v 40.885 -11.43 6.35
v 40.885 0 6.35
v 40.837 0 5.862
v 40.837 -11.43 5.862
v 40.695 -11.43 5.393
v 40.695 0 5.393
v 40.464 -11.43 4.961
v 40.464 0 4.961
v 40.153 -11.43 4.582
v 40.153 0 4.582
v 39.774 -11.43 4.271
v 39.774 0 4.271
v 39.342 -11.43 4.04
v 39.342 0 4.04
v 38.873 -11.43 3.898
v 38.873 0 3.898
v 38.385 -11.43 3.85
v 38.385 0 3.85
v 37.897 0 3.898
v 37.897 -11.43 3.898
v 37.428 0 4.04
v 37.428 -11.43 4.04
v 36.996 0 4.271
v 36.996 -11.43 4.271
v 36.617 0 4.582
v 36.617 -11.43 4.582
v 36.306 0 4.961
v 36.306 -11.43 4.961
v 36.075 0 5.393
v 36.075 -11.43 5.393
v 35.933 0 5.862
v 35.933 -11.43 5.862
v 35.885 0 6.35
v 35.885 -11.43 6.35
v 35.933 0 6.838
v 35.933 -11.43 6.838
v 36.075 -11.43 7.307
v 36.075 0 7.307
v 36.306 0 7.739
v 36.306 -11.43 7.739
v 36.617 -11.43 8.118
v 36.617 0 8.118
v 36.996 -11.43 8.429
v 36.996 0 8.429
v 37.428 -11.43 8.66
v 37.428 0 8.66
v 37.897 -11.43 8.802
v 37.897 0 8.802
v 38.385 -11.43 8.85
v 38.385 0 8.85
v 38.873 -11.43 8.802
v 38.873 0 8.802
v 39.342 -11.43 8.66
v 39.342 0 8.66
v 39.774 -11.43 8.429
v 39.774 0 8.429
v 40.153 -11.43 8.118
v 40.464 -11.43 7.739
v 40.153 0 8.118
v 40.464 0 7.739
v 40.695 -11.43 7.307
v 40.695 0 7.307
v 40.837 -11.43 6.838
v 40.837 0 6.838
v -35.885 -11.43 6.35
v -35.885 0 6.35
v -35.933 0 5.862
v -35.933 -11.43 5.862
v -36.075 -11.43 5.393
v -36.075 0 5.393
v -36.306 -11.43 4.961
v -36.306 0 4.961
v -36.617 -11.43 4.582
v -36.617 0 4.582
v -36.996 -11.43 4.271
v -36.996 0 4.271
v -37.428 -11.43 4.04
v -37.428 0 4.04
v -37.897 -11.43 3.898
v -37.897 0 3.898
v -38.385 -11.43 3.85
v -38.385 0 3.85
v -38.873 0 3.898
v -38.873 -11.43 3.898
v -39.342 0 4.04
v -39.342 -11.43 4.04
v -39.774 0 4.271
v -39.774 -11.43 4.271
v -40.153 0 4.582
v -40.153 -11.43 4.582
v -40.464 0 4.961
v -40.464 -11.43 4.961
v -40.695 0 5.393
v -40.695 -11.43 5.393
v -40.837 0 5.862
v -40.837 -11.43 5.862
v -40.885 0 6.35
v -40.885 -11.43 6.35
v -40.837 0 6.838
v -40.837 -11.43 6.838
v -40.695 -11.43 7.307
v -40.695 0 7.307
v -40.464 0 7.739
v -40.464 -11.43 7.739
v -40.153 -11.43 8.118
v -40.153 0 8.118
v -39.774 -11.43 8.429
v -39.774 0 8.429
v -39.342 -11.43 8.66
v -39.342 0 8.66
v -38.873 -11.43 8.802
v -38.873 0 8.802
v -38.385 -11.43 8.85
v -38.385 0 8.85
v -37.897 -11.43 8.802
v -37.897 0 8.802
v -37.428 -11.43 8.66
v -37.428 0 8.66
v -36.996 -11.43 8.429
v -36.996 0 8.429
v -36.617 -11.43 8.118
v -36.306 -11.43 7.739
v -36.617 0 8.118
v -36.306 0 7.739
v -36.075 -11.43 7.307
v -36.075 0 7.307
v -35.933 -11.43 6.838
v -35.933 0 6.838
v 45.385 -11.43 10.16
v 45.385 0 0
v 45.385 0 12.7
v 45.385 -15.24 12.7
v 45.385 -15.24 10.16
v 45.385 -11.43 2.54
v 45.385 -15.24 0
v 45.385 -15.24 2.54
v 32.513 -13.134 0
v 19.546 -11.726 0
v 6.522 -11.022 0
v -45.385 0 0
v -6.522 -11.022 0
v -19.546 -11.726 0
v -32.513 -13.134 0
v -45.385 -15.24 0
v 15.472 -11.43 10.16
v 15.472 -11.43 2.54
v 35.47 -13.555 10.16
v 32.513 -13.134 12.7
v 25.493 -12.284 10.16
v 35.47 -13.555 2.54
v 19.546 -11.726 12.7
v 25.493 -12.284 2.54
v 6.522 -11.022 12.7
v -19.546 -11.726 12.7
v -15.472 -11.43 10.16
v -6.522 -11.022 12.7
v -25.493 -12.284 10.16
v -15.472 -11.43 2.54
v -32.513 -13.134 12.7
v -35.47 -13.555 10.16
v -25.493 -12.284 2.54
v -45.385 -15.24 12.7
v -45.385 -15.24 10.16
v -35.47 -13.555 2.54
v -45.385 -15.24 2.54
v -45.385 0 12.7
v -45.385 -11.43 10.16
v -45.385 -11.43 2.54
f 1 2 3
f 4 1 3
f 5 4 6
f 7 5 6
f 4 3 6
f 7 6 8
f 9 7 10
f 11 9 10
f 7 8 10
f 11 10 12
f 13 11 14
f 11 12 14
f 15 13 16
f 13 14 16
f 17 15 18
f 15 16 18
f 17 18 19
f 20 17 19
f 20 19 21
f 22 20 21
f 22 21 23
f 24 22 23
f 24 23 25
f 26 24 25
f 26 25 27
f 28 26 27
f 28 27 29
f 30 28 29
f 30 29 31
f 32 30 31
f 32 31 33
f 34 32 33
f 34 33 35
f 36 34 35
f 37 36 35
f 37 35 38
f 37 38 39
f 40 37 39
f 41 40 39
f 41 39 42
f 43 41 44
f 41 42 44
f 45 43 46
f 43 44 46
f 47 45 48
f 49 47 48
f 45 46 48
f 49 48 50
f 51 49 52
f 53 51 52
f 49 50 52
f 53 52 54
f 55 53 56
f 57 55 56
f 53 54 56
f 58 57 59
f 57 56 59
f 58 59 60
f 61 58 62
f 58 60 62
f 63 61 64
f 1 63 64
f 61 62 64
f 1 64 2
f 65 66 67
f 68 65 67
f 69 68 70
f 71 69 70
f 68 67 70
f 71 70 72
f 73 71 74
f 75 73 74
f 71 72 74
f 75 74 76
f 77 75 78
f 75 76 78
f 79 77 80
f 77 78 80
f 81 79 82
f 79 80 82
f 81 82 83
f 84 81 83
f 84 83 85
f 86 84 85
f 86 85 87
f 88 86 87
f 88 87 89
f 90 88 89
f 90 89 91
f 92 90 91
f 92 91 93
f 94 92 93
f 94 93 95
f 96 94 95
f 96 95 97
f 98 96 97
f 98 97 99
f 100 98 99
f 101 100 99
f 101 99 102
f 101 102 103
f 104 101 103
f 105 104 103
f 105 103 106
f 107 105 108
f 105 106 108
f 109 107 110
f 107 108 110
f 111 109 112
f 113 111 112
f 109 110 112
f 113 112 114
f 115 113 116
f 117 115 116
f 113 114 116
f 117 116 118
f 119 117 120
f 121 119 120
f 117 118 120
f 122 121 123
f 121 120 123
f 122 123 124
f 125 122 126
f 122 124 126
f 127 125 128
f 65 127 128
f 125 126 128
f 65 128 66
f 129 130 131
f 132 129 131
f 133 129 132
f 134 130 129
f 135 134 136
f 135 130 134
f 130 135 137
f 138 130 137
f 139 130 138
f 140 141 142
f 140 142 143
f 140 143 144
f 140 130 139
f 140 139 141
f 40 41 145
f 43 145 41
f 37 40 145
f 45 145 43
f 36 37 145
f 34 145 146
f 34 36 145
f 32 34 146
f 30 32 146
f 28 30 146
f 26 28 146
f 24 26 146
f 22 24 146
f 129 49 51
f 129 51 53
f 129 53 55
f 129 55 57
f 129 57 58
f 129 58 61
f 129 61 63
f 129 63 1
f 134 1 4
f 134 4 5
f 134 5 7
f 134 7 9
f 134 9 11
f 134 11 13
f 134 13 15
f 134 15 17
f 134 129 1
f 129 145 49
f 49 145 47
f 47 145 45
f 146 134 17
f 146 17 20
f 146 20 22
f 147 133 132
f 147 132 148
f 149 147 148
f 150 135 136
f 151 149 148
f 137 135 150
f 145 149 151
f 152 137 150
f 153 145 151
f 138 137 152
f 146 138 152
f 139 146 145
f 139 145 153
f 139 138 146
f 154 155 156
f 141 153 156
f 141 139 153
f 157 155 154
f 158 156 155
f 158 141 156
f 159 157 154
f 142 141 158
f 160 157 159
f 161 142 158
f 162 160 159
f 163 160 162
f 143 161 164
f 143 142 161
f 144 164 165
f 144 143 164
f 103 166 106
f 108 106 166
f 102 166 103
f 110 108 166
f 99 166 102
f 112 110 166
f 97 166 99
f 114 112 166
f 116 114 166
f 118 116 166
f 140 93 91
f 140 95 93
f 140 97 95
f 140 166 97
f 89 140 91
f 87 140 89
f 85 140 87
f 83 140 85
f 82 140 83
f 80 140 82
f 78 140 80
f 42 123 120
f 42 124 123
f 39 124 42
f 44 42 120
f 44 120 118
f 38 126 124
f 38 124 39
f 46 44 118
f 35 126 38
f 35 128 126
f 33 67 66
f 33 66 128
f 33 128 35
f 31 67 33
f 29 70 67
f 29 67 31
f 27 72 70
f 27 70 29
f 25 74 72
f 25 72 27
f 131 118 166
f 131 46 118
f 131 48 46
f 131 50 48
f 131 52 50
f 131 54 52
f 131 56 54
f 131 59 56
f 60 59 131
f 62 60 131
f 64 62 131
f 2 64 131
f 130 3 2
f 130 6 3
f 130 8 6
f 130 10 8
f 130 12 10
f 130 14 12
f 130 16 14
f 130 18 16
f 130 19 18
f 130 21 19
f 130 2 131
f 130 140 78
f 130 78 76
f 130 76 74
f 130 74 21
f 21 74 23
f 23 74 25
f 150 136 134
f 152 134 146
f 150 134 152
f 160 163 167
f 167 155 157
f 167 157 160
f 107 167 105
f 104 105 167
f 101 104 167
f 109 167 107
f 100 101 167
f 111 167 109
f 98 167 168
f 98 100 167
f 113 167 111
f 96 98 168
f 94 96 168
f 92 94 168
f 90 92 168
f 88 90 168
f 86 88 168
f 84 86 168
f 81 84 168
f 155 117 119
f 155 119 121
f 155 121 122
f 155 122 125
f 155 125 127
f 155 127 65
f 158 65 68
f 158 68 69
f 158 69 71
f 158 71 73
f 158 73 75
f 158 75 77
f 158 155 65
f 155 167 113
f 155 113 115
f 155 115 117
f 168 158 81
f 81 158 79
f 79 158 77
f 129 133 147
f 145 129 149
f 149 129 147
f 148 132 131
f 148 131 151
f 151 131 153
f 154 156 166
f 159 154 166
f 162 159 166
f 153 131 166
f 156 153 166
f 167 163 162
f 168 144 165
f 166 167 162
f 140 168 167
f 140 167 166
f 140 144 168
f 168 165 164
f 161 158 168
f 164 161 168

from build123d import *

# Parameters (mm, degrees)
BOSS_EXTRUDE1_DEPTH = 12.7
SKETCH2_R           = 2.5
CUT_EXTRUDE1_DEPTH  = 16.24
SKETCH3_W           = 7.62
SKETCH3_H           = 3.81
CUT_EXTRUDE2_DEPTH  = 91.7700001


with BuildPart() as part:
    # Sketch1 → Boss-Extrude1 (new body)
    with BuildSketch(Plane.XY):
        with BuildLine():
            Line((-45.385, 0), (45.385, 0))
            Line((45.385, 0), (45.385, -15.24))
            ThreePointArc((45.385, -15.24), (0, -10.933442473), (-45.385, -15.24))
            Line((-45.385, -15.24), (-45.385, 0))
        make_face()
    extrude(amount=BOSS_EXTRUDE1_DEPTH)

    # Sketch2 → Cut-Extrude1 (cut, through all)
    with BuildSketch(Plane(origin=(0, 0, 0), x_dir=(1, 0, 0), z_dir=(0, 1, 0))):
        with Locations((-38.385, -6.35)):
            Circle(SKETCH2_R)
        with Locations((38.385, -6.35)):
            Circle(SKETCH2_R)
    extrude(amount=-CUT_EXTRUDE1_DEPTH, mode=Mode.SUBTRACT)

    # Sketch3 → Cut-Extrude2 (cut, through all)
    with BuildSketch(Plane(origin=(45.385, 0, 0), x_dir=(0, 0, -1), z_dir=(1, 0, 0))):
        with Locations((-6.35, -13.335)):
            Rectangle(SKETCH3_W, SKETCH3_H)
    extrude(amount=-CUT_EXTRUDE2_DEPTH, mode=Mode.SUBTRACT)


solid = part.part
